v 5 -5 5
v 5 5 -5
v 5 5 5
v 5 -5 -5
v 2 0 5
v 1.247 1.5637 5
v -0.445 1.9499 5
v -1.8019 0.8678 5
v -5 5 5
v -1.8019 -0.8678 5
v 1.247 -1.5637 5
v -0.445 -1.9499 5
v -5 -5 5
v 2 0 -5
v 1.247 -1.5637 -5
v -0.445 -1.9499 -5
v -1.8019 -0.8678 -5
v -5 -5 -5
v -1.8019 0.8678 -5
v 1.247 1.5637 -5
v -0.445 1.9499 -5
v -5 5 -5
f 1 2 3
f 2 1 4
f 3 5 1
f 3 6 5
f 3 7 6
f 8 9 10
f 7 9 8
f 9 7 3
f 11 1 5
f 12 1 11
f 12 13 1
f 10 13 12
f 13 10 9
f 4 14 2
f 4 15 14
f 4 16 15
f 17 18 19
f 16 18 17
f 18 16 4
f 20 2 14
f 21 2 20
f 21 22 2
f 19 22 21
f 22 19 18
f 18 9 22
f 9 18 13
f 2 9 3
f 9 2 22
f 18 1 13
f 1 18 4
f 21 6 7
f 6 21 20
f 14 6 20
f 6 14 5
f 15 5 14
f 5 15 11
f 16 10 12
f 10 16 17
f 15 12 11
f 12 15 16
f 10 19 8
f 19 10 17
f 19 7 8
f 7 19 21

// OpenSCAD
difference() {
    cube(10,center=true);
    cylinder(r=2,h=11,center=true);
}
